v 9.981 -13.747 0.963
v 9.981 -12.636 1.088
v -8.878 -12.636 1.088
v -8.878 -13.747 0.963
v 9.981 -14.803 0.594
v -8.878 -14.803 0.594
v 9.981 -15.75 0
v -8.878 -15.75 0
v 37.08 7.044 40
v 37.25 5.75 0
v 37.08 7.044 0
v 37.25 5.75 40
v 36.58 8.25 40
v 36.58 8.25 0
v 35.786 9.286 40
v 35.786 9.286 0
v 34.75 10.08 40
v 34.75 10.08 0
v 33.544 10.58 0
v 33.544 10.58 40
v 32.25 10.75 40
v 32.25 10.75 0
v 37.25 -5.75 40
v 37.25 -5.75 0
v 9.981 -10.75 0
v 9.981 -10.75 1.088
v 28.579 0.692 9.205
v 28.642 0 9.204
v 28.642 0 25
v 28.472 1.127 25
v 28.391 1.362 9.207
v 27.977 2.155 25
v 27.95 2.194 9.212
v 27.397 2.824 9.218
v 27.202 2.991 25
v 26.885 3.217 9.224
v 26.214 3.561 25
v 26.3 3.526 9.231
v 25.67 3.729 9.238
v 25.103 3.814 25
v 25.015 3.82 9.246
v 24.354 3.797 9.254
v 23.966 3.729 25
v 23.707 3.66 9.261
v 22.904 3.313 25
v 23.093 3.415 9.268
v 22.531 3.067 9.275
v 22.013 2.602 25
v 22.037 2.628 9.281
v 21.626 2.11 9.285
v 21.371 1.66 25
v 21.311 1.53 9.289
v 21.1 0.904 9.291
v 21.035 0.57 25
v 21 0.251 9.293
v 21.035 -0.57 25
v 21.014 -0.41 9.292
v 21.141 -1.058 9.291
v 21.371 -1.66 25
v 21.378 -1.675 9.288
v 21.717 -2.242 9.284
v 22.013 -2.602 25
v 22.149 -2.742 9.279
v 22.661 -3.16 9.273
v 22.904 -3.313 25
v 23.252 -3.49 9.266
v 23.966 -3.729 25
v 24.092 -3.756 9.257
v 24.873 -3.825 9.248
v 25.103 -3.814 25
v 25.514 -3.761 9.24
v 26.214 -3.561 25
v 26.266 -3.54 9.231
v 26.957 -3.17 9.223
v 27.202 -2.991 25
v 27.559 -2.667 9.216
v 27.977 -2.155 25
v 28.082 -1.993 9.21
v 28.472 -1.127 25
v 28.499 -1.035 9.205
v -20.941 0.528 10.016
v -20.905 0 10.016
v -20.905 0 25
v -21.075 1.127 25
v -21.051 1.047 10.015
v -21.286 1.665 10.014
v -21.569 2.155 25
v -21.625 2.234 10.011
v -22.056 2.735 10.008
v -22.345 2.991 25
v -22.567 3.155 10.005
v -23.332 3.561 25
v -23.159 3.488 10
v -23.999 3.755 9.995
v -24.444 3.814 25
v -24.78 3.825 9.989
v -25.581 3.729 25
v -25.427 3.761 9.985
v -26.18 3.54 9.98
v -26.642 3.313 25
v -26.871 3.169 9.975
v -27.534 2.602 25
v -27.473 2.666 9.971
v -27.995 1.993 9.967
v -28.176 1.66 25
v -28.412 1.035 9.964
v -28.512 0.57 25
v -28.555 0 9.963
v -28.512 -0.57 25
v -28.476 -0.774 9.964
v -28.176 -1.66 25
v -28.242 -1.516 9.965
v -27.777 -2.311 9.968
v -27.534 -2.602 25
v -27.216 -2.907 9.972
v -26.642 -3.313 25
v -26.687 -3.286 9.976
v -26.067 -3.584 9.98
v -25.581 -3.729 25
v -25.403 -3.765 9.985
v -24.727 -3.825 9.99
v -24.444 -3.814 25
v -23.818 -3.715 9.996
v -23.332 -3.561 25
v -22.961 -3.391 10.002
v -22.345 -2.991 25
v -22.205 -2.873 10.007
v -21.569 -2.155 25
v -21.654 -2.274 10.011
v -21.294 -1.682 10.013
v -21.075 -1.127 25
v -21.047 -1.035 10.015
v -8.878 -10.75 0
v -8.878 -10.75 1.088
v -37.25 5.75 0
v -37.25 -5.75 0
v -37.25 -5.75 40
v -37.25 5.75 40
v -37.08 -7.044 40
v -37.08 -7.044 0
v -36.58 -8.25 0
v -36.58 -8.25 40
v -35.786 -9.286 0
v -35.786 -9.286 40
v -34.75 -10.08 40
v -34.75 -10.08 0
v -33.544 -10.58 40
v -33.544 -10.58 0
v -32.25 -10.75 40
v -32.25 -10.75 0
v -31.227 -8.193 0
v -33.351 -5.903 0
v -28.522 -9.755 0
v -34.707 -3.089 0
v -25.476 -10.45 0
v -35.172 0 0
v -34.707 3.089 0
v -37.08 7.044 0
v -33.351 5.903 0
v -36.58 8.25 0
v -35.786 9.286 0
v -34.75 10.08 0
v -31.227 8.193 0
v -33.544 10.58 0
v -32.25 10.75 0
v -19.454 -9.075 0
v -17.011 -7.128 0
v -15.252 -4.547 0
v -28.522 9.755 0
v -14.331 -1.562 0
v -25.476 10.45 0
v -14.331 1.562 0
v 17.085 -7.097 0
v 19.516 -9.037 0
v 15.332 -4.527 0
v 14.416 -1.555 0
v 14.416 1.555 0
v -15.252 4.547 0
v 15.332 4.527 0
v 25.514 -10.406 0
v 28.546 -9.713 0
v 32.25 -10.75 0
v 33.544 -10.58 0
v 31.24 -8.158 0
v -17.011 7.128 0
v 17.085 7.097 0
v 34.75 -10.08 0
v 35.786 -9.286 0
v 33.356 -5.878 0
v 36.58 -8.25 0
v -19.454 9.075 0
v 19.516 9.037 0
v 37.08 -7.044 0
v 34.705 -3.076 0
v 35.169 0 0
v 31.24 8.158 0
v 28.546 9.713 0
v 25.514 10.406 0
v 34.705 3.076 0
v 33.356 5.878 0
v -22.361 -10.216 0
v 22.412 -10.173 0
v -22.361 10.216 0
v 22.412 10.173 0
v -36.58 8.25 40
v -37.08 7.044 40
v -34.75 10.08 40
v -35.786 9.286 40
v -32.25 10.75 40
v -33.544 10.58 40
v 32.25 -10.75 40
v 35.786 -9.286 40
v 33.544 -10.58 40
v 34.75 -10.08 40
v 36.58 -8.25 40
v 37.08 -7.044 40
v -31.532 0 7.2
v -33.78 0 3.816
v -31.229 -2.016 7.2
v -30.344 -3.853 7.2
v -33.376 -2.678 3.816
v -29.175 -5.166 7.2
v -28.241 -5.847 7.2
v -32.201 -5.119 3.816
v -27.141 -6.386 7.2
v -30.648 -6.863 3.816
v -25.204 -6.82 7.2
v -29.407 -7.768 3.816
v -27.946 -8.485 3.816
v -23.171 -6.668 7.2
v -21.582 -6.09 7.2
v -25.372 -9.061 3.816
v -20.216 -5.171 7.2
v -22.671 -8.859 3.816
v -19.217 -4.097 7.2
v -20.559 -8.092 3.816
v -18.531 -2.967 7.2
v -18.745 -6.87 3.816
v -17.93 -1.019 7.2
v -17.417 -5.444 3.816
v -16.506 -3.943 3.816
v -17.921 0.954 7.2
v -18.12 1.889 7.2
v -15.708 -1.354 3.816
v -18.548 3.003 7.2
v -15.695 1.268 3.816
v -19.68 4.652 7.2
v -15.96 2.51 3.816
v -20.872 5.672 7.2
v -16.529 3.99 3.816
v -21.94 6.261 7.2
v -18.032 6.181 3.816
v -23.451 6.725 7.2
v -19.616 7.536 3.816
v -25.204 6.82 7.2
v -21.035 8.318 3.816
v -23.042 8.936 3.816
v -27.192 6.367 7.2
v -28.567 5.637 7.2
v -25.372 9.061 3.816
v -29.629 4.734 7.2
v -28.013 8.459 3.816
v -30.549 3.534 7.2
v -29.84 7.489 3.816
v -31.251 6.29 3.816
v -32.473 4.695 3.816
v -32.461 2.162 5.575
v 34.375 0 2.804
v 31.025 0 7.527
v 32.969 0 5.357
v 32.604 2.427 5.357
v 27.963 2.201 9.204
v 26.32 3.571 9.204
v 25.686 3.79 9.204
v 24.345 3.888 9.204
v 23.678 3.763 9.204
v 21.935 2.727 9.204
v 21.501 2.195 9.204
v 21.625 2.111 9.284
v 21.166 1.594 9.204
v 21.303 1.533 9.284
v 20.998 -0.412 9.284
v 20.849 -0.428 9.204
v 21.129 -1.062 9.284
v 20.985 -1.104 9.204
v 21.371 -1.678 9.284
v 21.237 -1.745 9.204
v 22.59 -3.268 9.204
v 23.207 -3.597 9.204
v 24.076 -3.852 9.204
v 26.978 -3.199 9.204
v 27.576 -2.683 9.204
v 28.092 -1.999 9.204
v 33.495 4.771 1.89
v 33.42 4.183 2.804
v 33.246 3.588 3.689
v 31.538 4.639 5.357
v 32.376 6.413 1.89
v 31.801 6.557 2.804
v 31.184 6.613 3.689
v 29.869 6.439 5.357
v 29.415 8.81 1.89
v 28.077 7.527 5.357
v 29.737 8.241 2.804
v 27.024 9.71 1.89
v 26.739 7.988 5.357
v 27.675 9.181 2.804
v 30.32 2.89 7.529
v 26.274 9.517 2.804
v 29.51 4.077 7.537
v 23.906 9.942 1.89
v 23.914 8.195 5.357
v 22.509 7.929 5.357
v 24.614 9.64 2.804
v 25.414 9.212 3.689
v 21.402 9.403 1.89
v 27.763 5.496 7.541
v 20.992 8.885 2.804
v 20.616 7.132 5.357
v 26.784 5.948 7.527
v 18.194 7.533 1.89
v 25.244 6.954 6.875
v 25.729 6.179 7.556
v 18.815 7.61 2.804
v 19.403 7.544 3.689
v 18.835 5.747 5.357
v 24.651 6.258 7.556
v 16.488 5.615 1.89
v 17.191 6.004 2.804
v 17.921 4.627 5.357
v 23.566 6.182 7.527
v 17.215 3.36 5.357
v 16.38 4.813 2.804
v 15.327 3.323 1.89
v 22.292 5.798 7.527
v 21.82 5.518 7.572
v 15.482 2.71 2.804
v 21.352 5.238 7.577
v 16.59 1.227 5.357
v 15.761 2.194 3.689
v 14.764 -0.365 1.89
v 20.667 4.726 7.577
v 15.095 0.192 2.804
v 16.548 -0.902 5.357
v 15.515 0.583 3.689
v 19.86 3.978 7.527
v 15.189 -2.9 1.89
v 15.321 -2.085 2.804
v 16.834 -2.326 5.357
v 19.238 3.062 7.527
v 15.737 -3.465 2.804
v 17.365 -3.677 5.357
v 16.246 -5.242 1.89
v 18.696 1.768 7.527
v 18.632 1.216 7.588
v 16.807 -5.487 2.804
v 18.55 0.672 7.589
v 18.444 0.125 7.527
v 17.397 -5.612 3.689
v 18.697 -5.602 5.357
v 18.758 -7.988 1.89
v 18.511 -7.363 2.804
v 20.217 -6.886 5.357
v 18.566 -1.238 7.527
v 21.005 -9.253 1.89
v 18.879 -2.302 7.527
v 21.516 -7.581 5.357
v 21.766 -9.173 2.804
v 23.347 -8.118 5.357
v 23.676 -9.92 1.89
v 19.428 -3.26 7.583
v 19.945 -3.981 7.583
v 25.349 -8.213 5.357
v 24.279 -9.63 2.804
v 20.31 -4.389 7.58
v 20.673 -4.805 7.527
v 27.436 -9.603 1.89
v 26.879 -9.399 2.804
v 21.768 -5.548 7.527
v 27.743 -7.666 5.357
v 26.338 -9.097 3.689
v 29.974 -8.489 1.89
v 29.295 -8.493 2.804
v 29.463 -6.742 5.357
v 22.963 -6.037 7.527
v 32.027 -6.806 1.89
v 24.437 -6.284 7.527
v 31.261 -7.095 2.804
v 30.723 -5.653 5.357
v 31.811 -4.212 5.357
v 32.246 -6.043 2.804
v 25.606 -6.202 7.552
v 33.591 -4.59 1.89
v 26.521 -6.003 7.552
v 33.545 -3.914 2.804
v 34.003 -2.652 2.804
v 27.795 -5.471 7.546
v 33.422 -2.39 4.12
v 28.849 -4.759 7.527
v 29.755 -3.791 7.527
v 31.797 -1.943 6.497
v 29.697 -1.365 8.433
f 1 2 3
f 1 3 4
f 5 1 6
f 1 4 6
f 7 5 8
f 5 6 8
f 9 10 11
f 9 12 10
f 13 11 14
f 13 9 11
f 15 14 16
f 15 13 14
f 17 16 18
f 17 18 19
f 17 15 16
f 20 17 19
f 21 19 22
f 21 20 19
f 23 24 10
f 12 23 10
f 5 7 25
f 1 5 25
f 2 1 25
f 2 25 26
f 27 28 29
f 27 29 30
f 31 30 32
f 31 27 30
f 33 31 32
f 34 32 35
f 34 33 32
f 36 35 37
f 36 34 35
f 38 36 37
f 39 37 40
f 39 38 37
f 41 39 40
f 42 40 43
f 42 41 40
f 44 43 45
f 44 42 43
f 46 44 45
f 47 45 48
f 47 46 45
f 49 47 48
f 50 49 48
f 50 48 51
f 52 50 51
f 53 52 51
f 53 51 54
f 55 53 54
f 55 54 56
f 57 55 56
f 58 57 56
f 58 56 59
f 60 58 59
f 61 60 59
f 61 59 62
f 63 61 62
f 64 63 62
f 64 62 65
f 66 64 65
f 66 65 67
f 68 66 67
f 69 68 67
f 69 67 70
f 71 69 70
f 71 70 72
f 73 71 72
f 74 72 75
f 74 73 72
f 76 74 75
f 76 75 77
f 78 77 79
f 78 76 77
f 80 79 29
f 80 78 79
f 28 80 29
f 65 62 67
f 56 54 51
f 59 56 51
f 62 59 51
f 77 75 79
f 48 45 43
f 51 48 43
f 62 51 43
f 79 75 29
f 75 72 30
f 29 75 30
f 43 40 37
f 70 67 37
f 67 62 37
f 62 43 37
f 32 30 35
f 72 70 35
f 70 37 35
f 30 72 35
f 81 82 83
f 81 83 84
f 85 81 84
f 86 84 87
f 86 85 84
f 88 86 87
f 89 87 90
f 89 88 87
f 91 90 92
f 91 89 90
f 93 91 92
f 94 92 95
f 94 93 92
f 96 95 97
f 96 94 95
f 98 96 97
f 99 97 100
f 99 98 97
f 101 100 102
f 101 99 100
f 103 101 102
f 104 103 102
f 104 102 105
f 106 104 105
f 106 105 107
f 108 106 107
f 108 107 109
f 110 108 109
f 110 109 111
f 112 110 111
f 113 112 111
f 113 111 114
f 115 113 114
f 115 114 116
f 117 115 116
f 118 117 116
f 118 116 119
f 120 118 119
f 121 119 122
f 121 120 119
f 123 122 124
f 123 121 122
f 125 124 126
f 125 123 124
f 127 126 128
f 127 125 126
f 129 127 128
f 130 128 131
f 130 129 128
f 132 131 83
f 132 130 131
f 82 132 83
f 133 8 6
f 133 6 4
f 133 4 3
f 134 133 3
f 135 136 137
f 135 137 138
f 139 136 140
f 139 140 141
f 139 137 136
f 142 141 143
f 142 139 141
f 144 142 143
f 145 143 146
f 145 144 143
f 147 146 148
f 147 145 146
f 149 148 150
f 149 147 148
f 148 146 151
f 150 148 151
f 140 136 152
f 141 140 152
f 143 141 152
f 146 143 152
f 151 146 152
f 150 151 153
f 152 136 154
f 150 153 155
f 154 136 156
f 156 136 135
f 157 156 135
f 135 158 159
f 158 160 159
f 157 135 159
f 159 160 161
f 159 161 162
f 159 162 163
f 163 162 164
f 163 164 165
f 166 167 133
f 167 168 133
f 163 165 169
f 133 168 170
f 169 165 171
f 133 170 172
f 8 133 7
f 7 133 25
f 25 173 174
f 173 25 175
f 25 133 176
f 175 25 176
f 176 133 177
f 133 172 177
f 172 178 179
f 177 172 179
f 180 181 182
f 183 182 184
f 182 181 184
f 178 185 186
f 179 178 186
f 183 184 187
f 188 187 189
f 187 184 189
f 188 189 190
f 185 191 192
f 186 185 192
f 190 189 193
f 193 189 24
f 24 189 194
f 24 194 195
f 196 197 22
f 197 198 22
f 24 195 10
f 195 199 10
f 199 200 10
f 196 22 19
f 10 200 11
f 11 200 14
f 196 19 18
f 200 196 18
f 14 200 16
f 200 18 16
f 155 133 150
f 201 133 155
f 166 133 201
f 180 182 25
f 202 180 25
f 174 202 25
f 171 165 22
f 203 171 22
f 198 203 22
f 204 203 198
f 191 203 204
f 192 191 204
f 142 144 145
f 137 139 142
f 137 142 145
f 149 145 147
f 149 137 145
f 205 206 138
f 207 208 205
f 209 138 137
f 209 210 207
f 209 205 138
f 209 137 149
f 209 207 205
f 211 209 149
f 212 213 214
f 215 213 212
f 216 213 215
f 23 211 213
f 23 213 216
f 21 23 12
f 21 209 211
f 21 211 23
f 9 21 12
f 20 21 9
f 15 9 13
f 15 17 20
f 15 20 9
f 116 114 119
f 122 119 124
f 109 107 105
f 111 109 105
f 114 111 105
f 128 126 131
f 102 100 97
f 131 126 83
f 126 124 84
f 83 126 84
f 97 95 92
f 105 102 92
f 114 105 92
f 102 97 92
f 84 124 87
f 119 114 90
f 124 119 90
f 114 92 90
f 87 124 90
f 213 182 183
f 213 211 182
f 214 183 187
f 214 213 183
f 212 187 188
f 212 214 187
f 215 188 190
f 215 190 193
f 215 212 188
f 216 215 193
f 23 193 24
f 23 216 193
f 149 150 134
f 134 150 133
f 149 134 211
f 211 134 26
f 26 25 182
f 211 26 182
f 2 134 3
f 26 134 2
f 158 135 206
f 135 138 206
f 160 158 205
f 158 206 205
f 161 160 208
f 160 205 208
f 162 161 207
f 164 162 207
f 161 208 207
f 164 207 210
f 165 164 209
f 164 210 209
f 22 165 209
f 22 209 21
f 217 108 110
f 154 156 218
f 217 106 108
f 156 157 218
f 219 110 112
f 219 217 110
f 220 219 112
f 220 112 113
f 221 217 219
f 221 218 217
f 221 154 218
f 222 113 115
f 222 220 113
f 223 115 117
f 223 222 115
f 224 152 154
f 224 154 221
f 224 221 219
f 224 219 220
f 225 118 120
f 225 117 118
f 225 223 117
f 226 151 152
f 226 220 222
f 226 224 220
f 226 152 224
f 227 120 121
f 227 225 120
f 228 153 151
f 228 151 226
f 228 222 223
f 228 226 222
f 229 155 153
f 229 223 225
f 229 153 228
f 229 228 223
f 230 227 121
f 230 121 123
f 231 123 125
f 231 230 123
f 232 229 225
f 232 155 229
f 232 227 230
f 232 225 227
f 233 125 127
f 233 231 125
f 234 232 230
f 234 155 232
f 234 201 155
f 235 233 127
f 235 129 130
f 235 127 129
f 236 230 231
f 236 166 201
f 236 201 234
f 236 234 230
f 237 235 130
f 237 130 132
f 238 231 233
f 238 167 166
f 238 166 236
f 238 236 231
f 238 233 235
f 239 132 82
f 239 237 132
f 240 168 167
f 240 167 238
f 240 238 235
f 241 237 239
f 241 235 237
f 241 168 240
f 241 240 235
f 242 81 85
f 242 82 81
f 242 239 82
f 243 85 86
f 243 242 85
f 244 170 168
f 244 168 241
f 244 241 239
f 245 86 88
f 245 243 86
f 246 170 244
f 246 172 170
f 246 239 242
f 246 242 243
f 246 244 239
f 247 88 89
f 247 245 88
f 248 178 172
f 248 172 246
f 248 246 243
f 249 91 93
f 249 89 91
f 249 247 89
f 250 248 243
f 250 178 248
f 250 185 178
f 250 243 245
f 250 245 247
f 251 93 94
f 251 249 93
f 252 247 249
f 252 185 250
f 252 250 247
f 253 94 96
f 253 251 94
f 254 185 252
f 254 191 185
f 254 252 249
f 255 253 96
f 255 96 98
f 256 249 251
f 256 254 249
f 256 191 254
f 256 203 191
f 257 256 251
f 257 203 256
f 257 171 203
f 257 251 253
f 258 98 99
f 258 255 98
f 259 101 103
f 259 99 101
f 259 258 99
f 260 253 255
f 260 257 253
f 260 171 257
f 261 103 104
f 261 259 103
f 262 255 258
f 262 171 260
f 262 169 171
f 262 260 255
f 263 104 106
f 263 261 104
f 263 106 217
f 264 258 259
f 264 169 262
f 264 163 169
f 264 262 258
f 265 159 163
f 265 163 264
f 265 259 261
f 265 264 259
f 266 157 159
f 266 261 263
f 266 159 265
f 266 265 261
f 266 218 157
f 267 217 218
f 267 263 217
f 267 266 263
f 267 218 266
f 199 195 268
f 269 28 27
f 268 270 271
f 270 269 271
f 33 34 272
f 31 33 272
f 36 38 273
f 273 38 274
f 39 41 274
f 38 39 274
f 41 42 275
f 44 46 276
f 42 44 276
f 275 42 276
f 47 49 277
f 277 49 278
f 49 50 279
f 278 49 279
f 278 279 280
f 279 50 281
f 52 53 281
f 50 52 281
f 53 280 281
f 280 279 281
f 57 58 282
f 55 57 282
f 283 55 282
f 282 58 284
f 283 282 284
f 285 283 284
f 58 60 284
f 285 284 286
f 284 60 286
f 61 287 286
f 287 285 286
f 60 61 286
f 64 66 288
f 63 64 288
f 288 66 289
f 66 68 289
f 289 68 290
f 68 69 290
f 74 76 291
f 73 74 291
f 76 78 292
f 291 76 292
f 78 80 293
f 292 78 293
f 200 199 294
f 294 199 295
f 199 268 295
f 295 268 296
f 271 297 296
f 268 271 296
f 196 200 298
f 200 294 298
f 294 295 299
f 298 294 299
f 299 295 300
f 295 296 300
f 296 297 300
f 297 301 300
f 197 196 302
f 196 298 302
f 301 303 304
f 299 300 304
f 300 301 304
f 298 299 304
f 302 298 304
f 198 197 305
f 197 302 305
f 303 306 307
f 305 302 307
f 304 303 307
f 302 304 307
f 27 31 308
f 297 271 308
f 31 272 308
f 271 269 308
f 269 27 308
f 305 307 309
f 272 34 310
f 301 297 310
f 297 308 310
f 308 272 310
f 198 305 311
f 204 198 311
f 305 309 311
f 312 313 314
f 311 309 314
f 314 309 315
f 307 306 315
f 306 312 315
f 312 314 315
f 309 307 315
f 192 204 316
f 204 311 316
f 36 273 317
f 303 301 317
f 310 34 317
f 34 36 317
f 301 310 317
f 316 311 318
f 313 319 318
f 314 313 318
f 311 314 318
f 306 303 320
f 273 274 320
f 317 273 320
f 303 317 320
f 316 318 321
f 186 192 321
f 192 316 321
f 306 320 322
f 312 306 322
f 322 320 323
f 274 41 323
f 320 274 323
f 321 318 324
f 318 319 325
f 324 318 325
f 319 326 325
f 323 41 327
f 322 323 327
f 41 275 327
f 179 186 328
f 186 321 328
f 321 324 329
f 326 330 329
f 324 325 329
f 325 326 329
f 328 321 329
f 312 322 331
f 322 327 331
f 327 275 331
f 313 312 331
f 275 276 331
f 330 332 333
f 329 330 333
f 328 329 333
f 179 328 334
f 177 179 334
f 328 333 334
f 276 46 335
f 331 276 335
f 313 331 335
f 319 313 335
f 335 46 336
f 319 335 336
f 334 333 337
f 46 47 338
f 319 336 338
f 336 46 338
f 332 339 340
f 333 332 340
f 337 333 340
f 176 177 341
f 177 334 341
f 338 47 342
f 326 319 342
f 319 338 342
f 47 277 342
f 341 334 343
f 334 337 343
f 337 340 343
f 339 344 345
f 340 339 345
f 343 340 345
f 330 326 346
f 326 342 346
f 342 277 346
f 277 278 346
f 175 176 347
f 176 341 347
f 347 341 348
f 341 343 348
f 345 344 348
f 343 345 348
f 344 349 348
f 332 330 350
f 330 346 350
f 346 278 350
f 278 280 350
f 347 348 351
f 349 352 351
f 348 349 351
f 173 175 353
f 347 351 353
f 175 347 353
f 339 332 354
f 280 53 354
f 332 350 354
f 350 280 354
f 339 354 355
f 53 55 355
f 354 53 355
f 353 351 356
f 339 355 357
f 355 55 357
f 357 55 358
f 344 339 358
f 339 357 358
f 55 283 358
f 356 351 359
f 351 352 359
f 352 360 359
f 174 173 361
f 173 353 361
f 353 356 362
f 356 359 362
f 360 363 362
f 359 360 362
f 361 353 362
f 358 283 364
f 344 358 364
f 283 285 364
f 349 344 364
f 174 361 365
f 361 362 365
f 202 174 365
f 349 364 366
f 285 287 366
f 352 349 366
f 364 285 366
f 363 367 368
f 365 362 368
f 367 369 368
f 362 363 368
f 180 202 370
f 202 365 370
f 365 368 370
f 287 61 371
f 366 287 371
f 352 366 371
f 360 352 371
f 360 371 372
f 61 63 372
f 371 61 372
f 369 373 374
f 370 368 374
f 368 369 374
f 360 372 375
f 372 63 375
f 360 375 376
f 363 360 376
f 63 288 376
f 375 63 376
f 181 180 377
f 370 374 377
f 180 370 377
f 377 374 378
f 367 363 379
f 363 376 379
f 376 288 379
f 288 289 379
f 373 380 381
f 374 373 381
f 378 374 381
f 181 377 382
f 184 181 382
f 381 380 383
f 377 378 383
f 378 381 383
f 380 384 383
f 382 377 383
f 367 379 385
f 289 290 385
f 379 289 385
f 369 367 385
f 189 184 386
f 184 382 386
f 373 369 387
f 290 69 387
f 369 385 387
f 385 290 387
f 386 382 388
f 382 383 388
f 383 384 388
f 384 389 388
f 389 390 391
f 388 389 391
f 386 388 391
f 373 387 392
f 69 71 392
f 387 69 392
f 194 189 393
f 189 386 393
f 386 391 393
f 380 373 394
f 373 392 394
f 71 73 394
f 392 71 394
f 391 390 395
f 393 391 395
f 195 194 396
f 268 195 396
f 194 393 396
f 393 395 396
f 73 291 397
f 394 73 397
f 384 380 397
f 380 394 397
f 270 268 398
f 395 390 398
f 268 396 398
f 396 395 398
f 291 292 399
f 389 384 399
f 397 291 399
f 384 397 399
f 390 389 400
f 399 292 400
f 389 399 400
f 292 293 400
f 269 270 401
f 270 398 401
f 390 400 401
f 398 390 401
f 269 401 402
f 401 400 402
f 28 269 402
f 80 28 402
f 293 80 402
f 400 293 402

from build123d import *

# Parameters (mm, degrees)
F0_W        = 74.5
F0_H        = 21.5
F0_R        = 10.55
F1_DEPTH    = 40
F2_R        = 5
F7_W        = 18.8593324274
F7_H        = 1.088095014
F8_DEPTH    = 5
F9_T1_DEPTH = 34.4293351412
F10_R       = 3.825
F11_DEPTH   = 25
F12_R       = 3.825
F13_DEPTH   = 25


# Not quite as in the source:
# - a fillet or chamfer that OpenCascade refuses, or shapes differently, is made with other operations: its cross-section is extruded or revolved along the edge and cut away or added


with BuildPart() as f1:
    # F0 (on Top) → F1 (new body)
    with BuildSketch(Plane.XY):
        Rectangle(F0_W, F0_H)
        with Locations((-24.6931102476, 0)):
            Circle(F0_R, mode=Mode.SUBTRACT)
        with BuildLine():
            ThreePointArc((35.3068897524, 0), (24.7568897524, -10.55), (14.2068897524, 0))
            ThreePointArc((14.2068897524, 0), (24.7568897524, 10.55), (35.3068897524, 0))
        make_face(mode=Mode.SUBTRACT)
        with Locations((-24.6931102476, 0)):
            Circle(F0_R)
        with BuildLine():
            ThreePointArc((35.3068897524, 0), (24.7568897524, 10.55), (14.2068897524, 0))
            ThreePointArc((14.2068897524, 0), (24.7568897524, -10.55), (35.3068897524, 0))
        make_face()
    extrude(amount=F1_DEPTH)

    # F2
    f2_edges = [f1.edges().sort_by_distance(p)[0] for p in [
        (-37.25, -10.75, 20),
        (37.25, -10.75, 20),
        (-37.25, 10.75, 20),
        (37.25, 10.75, 20),
    ]]
    fillet(f2_edges, radius=F2_R)

    # F3 (on Front) → F4 (revolve, cut)
    with BuildSketch(Plane.XZ):
        with BuildLine():
            Line((-35.1722761989, 0), (-28.4331102476, 0))
            Line((-28.4331102476, 0), (-28.4331102476, 10.0509282202))
            ThreePointArc((-28.4331102476, 10.0509282202), (-32.7146634372, 5.6369418244), (-35.1722761989, 0))
        make_face()
    revolve(axis=Axis((-24.6931102476, 0, 9.2185929652), (0, 0, 1)), mode=Mode.SUBTRACT)

    # F5 (on Front) → F6 (revolve, cut)
    with BuildSketch(Plane.XZ):
        with BuildLine():
            Line((28.4479595721, 9.307410568), (28.4479595721, 0))
            Line((28.4479595721, 0), (35.168658942, 0))
            ThreePointArc((35.168658942, 0), (32.9055101663, 5.445972629), (28.4479595721, 9.307410568))
        make_face()
    revolve(axis=Axis((24.7338861227, 0, 7.0413234644), (0, 0, 1)), mode=Mode.SUBTRACT)

    # F7 (on face) → F8 (join)
    with BuildSketch(Plane.XZ.offset(10.75)):
        with Locations((0.5516856909, 0.544047507)):
            Rectangle(F7_W, F7_H)
    extrude(amount=F8_DEPTH)

    # F9: fillet of radius 5 on 1 edges, made by hand

    # F9_s2 → F9_t1 (cut)
    with BuildSketch(Plane.YZ.offset(-16.6629818797)):
        with BuildLine():
            ThreePointArc((-12.6359994572, 1.088095014), (-14.2853137193, 0.8082393407), (-15.75, 0))
            Line((-15.75, 0), (-15.75, 1.088095014))
            Line((-15.75, 1.088095014), (-12.6359994572, 1.088095014))
        make_face()
    extrude(amount=F9_T1_DEPTH, mode=Mode.SUBTRACT)

    # F10 (on Top) → F11 (cut)
    with BuildSketch(Plane.XY):
        with Locations((-24.7297555931, 0)):
            Circle(F10_R)
    extrude(amount=F11_DEPTH, mode=Mode.SUBTRACT)

    # F12 (on Top) → F13 (cut)
    with BuildSketch(Plane.XY):
        with Locations((24.8167866624, 0)):
            Circle(F12_R)
    extrude(amount=F13_DEPTH, mode=Mode.SUBTRACT)


solid = f1.part
